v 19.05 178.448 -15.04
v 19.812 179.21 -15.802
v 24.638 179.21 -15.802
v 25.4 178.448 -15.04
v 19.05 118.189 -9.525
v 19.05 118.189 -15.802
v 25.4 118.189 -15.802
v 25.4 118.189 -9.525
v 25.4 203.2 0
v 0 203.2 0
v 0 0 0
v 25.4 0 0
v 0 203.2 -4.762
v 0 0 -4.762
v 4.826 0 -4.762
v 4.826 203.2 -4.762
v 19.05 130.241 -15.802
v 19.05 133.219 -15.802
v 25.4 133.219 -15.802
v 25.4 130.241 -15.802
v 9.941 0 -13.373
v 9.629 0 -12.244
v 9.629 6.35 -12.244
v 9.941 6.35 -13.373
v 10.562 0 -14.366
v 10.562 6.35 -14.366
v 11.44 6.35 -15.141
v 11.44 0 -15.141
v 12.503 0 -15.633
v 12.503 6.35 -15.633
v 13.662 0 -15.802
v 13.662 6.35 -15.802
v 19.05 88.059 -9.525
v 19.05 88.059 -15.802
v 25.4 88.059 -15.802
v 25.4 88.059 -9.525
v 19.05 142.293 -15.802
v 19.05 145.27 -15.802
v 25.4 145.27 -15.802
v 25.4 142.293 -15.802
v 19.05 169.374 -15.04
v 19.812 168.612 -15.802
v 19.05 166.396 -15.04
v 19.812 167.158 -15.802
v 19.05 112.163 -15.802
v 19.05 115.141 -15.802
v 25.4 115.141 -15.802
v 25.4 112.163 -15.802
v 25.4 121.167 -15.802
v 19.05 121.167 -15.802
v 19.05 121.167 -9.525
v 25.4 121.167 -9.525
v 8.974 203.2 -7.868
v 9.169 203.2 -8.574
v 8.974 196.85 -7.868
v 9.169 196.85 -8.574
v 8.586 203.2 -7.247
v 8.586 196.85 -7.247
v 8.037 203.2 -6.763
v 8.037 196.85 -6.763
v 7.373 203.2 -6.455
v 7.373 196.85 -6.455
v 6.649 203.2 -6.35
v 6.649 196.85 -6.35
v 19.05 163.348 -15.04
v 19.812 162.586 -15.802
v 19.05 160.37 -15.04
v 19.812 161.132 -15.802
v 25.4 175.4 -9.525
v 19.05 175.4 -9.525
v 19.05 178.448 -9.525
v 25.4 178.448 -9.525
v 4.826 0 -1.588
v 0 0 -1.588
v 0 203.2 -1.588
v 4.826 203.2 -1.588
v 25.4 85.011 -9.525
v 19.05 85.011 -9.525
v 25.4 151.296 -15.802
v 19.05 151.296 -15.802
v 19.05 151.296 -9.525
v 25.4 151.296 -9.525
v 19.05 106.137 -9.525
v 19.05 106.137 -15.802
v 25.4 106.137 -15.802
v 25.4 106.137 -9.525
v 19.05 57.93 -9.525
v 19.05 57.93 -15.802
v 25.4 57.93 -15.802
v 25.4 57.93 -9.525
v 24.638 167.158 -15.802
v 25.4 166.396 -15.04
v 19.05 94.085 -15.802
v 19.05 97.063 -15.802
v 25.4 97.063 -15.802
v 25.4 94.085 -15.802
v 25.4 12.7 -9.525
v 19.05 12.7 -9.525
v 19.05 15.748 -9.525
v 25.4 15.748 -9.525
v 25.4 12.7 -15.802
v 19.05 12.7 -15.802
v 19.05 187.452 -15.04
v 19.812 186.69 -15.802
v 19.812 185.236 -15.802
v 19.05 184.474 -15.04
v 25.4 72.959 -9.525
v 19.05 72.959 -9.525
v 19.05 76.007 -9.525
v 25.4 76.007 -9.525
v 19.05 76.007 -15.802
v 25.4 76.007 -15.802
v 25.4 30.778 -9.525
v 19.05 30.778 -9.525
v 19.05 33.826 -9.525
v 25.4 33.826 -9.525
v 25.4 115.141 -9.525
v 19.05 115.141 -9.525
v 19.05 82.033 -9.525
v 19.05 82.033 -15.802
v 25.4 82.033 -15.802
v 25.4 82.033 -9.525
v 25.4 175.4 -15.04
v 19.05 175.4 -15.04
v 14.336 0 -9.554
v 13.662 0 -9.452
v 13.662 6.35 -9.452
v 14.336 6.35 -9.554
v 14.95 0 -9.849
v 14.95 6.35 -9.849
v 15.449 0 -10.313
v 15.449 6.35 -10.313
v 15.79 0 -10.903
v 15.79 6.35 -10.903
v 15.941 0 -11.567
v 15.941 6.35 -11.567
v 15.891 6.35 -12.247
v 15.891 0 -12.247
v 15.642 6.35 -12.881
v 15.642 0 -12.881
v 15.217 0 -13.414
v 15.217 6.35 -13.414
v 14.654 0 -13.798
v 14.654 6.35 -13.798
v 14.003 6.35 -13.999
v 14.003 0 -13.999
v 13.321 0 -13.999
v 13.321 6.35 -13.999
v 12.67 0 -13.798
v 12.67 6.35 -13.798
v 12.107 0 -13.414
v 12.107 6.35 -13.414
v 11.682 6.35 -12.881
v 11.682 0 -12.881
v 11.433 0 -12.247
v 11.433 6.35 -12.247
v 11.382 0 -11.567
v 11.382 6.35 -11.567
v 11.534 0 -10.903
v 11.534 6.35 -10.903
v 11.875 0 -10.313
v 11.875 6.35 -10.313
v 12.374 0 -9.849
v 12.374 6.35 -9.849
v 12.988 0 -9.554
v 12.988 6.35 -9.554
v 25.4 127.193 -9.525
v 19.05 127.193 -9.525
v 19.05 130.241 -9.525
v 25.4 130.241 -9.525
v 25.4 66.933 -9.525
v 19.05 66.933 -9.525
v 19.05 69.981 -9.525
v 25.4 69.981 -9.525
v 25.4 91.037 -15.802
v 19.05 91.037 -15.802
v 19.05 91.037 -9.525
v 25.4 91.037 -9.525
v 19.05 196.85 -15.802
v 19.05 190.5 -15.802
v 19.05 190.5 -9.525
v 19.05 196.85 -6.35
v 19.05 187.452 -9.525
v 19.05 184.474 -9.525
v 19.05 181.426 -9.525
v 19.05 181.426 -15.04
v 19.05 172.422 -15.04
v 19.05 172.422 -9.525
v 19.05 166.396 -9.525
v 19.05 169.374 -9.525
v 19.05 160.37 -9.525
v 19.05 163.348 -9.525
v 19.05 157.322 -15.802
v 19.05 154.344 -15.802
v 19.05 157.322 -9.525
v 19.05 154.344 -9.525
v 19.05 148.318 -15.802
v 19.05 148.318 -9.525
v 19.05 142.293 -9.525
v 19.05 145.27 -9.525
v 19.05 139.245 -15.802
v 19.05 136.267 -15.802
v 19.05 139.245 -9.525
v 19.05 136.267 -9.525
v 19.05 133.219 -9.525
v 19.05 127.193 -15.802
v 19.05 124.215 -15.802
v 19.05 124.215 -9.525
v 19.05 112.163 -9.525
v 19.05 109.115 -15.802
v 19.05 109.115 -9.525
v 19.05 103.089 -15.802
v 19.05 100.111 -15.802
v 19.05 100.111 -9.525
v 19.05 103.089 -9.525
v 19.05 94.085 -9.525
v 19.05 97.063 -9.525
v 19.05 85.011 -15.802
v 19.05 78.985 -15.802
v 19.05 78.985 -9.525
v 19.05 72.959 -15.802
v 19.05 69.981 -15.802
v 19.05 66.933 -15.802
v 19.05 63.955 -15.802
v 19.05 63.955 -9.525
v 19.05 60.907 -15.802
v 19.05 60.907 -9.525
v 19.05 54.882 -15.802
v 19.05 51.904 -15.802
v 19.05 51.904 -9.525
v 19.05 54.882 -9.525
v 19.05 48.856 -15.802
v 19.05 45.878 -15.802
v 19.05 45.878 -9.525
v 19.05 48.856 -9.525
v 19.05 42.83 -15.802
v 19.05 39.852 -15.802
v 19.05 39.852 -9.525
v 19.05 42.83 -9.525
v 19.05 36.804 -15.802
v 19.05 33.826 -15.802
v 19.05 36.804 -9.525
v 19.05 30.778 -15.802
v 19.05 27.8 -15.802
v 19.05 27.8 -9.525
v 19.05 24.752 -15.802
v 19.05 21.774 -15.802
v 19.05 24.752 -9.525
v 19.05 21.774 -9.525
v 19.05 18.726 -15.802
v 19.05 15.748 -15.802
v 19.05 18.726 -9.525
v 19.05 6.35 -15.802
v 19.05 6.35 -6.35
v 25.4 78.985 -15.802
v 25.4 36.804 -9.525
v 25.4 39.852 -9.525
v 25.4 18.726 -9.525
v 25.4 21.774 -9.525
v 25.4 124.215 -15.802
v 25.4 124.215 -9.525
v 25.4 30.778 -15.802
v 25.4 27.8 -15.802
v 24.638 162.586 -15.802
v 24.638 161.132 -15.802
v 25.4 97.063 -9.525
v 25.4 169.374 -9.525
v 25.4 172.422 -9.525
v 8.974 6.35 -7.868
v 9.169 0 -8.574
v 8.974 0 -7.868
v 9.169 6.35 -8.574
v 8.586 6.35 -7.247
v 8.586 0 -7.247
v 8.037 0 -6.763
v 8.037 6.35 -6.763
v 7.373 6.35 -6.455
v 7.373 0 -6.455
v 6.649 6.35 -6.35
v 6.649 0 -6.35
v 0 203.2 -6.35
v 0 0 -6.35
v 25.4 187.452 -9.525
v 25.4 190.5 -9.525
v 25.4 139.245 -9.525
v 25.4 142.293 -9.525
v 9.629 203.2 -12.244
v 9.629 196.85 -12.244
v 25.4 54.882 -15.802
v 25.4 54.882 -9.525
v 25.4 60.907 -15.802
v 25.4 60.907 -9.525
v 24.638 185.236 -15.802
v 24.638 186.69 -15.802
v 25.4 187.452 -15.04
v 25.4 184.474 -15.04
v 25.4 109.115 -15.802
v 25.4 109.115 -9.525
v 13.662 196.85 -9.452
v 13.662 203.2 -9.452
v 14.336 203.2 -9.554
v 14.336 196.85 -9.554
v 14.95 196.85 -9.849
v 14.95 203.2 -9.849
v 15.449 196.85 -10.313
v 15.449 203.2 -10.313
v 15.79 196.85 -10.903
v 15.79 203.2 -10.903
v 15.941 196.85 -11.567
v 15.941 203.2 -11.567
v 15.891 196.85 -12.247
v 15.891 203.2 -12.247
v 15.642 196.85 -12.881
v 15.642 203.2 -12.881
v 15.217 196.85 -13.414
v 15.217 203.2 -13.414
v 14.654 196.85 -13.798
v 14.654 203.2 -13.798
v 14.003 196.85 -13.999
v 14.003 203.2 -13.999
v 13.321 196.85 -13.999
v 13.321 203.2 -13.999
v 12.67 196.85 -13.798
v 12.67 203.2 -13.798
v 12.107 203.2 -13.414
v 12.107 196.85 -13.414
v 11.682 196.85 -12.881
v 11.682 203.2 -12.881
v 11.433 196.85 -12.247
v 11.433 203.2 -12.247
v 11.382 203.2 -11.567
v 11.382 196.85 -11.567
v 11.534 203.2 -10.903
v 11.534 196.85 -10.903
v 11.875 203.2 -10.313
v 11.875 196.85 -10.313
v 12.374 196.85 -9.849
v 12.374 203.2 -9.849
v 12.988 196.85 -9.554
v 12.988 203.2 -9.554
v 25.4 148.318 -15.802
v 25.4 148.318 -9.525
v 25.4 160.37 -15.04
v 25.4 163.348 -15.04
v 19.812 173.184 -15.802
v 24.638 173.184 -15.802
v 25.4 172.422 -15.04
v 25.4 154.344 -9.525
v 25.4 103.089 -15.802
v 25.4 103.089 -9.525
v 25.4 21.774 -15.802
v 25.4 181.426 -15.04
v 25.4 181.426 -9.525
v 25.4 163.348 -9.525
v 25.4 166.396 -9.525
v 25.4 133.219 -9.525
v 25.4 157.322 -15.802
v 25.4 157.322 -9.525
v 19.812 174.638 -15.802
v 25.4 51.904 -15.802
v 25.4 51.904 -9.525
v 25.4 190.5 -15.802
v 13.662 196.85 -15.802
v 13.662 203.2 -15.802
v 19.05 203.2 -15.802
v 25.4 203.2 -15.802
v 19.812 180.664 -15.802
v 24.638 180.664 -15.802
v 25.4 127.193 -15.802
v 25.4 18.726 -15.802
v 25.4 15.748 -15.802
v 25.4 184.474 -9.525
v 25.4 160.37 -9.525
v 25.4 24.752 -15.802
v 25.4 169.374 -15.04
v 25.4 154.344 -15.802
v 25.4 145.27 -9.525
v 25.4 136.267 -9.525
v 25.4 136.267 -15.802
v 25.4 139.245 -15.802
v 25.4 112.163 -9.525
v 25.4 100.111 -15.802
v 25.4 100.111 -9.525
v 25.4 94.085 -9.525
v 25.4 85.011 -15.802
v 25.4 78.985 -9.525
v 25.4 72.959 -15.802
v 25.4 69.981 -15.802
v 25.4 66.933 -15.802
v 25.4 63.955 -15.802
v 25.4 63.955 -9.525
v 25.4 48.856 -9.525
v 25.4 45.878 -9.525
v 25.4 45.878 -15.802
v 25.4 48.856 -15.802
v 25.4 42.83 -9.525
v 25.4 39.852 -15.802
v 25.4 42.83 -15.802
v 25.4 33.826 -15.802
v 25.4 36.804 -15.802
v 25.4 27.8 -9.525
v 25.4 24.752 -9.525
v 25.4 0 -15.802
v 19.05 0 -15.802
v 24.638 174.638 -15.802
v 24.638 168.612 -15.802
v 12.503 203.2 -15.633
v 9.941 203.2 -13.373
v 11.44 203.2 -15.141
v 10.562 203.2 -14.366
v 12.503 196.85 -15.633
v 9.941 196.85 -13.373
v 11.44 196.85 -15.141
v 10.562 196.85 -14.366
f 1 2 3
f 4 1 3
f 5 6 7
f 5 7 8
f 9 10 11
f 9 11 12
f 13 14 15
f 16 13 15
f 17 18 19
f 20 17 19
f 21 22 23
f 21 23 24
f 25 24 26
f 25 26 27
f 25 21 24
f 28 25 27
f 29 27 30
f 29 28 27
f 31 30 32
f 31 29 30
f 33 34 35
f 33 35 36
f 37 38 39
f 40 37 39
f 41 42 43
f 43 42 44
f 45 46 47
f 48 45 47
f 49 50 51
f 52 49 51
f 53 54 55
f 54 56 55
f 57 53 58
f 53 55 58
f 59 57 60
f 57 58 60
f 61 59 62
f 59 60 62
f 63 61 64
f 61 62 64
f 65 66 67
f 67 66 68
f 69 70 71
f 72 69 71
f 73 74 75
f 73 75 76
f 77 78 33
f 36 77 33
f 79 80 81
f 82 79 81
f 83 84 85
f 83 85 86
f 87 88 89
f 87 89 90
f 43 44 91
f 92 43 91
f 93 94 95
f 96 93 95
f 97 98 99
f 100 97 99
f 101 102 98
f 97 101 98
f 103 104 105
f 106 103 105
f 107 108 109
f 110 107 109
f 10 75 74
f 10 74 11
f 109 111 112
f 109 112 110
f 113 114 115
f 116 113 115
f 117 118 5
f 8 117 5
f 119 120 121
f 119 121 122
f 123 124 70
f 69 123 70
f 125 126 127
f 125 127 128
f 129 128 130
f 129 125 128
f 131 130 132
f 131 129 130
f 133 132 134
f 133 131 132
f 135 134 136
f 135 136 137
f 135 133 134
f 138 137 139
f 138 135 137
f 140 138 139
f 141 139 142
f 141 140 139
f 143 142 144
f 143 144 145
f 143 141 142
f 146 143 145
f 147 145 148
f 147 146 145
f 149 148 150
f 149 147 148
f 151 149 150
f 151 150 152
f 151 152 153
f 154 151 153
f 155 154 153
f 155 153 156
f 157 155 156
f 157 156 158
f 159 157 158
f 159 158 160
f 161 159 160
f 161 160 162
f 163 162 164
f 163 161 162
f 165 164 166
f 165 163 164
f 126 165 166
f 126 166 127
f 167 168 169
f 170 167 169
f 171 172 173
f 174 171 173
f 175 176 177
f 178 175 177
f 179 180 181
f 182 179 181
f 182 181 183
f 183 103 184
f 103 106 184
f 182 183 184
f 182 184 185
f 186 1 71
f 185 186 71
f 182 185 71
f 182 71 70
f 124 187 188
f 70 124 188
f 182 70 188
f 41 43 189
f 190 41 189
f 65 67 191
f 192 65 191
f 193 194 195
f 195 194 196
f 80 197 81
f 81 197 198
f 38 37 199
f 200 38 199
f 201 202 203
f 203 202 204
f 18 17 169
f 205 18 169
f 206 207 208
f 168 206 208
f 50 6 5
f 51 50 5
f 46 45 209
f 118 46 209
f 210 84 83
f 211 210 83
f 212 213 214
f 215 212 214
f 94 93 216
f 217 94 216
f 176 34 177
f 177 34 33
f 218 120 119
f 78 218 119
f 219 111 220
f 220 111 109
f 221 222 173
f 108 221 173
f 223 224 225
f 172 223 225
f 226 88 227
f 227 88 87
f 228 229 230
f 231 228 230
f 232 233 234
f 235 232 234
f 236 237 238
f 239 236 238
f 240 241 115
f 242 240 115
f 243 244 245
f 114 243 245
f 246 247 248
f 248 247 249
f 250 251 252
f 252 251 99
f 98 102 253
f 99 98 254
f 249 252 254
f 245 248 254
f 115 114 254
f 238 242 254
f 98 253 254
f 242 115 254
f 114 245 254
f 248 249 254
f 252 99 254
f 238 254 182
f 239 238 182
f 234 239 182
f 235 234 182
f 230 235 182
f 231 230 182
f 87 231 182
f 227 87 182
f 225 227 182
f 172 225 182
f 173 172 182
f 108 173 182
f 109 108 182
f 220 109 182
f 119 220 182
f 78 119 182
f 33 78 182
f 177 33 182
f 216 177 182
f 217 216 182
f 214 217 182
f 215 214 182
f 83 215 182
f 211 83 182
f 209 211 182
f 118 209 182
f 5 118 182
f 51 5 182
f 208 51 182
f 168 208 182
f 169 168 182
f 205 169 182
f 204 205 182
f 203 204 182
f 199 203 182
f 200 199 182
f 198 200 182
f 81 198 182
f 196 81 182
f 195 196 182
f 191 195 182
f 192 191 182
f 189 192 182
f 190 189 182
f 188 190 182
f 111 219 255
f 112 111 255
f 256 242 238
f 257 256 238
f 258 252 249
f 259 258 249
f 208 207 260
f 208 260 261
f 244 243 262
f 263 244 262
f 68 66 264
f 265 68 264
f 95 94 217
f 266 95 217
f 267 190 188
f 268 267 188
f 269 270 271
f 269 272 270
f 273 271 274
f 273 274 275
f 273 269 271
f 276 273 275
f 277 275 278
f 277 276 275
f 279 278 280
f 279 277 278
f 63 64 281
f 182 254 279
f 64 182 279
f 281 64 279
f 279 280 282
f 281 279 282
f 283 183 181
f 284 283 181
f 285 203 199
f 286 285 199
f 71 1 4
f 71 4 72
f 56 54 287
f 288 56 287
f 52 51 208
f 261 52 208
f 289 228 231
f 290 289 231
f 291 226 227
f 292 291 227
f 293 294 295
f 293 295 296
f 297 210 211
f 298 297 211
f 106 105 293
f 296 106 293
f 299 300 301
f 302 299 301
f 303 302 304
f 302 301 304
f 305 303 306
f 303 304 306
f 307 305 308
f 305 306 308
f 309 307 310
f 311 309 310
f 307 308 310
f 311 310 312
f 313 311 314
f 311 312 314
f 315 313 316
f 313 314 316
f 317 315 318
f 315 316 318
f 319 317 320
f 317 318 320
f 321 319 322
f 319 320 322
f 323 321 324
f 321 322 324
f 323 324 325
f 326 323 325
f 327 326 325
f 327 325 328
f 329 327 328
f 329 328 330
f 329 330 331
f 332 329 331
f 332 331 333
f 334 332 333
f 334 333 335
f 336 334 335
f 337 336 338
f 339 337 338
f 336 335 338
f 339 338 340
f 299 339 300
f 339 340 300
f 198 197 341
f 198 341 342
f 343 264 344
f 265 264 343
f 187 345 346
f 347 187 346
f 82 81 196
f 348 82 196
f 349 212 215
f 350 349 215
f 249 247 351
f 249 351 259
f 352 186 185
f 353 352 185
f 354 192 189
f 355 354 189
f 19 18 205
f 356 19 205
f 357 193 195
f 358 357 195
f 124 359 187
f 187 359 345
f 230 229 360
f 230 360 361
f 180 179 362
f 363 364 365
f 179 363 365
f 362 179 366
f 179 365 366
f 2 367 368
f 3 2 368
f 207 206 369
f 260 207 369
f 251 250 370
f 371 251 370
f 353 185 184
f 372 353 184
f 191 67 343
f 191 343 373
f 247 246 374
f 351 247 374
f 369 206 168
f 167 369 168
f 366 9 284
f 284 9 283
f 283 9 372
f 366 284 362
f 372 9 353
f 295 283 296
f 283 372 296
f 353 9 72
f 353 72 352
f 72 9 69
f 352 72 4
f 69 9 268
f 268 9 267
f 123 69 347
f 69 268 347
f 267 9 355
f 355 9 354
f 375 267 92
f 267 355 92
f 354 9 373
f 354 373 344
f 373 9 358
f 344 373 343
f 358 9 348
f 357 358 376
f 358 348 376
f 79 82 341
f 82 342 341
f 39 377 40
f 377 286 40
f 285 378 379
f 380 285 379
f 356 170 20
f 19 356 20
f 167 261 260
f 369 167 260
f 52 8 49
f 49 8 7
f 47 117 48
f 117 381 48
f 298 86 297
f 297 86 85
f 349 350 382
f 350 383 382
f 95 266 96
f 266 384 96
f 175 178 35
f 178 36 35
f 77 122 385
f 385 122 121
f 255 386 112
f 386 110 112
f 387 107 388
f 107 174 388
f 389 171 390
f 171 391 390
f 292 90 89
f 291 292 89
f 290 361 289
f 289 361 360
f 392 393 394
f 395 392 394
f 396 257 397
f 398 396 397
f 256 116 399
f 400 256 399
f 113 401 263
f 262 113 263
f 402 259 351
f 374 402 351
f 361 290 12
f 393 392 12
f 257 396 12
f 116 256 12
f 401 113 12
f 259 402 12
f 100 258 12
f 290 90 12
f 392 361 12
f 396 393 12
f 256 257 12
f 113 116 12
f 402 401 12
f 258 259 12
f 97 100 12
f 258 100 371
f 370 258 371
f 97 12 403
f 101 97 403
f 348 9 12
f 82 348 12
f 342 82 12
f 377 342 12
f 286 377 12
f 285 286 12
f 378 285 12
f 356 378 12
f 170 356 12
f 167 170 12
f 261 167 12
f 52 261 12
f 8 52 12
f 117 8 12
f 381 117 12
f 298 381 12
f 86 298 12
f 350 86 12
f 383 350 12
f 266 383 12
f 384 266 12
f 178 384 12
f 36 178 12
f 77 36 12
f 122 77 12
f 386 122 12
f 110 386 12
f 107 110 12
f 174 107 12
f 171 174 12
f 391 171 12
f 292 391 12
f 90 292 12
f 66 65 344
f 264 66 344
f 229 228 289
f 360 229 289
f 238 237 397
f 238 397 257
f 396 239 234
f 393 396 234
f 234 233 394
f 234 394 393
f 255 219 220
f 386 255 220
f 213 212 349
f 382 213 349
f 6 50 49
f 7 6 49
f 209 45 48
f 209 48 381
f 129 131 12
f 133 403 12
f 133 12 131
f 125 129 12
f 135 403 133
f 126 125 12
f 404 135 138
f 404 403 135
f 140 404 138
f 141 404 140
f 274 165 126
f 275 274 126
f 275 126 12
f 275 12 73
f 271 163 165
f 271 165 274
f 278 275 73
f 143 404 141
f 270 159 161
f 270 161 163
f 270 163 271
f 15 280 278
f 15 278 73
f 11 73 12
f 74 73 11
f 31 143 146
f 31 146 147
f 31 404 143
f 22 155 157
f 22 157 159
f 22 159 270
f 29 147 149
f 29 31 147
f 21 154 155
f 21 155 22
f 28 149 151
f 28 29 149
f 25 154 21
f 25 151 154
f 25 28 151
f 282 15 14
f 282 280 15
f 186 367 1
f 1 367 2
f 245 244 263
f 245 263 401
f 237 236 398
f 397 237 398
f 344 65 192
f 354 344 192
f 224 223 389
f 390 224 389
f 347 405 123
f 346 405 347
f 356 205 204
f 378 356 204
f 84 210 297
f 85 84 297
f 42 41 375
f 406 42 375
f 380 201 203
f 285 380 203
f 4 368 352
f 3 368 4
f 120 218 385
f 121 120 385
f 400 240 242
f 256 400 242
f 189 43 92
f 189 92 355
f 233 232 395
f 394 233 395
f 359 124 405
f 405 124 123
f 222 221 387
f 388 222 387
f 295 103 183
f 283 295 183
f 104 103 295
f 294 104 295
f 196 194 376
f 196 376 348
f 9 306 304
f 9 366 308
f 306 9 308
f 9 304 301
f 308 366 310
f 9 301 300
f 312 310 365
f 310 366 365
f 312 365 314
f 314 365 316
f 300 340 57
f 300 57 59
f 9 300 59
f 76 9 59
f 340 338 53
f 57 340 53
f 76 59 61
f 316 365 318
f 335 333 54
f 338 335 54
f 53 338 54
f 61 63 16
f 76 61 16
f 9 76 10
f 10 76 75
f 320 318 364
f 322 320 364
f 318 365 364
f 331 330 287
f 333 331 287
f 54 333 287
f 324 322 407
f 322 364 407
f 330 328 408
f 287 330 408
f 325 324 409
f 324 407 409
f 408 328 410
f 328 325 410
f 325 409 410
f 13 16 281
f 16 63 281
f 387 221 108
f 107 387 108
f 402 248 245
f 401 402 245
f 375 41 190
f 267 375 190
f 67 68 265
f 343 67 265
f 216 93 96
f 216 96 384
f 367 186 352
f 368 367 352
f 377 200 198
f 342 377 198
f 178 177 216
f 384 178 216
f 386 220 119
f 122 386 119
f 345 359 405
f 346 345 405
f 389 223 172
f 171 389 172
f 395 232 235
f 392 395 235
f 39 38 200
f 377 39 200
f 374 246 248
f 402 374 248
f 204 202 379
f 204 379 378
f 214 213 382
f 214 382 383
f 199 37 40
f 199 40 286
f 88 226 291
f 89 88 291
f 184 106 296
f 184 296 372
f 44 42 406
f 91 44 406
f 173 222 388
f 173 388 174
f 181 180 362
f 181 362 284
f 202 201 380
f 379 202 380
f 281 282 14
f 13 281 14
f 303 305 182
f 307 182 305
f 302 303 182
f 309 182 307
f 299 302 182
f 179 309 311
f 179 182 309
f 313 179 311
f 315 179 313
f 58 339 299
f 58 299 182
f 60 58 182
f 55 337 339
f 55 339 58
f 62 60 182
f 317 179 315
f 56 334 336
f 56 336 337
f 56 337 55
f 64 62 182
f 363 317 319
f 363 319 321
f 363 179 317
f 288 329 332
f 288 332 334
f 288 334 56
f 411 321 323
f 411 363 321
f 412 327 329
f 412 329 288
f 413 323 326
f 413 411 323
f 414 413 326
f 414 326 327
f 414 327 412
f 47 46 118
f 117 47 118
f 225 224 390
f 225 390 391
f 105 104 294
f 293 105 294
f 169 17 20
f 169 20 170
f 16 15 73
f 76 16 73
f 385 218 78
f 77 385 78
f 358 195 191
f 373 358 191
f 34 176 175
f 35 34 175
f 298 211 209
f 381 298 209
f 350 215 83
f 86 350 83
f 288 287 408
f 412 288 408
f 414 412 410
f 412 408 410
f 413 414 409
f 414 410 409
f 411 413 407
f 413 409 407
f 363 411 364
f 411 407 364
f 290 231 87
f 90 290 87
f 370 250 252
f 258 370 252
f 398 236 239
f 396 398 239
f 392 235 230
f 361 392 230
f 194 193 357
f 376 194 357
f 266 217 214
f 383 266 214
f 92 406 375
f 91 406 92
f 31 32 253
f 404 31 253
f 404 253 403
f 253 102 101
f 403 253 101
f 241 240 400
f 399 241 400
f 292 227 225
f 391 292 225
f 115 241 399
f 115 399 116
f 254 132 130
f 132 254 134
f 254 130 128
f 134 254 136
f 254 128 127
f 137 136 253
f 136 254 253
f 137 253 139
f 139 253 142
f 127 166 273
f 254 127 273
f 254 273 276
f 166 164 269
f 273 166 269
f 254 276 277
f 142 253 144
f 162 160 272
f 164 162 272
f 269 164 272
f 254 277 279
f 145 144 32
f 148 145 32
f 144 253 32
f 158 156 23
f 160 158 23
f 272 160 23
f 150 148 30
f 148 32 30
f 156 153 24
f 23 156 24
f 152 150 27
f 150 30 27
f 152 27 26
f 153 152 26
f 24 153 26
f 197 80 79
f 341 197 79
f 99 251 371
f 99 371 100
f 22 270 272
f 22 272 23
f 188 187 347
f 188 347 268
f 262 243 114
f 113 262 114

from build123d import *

# Parameters (mm, degrees)
BOSS_EXTRUDE1_DEPTH  = 203.2
SKETCH2_R            = 2.286
BOSS_EXTRUDE2_DEPTH  = 6.35
FILLET1_R            = 2.54
FILLET1_OF_MIRROR1_R = 2.54
SKETCH5_W            = 6.35
SKETCH5_H            = 9.597846327
CUT_EXTRUDE3_DEPTH   = 207.350575478
SKETCH3_W            = 6.277153673
SKETCH3_H            = 3.048
CUT_EXTRUDE1_DEPTH   = 205.701857736
SKETCH4_W            = 4.826
SKETCH4_H            = 3.175
CUT_EXTRUDE2_DEPTH   = 206.39013623
CHAMFER1_SIZE        = 0.762


with BuildPart() as part:
    # Sketch1 → Boss-Extrude1 (new body)
    with BuildSketch(Plane(origin=(0, 0, 0), x_dir=(1, 0, 0), z_dir=(0, 1, 0))):
        Polygon((0, 0), (25.4, 0), (25.4, 25.4), (19.05, 25.4), (19.05, 6.35), (0, 6.35), align=None)
    extrude(amount=BOSS_EXTRUDE1_DEPTH)

    # Sketch2 → Boss-Extrude2 (add)
    with BuildSketch(Plane(origin=(0, 203.2, 0), x_dir=(1, 0, 0), z_dir=(0, 1, 0))):
        with BuildLine():
            Line((19.05, 15.802153673), (19.05, 6.35))
            Line((19.05, 6.35), (8.89, 6.35))
            Line((8.89, 6.35), (9.629456844, 12.244049961))
            ThreePointArc((9.629456844, 12.244049961), (10.972967985, 14.785452355), (13.661846327, 15.802153673))
            Line((13.661846327, 15.802153673), (19.05, 15.802153673))
        make_face()
        with Locations(Location((13.661846327, 11.738153673, 0), (0, 0, 270))):
            Circle(SKETCH2_R, mode=Mode.SUBTRACT)
    boss_extrude2 = extrude(amount=-BOSS_EXTRUDE2_DEPTH)

    # Fillet1
    fillet1_edges = [part.edges().sort_by_distance(p)[0] for p in [
        (8.89, 200.025, -6.35),
    ]]
    fillet(fillet1_edges, radius=FILLET1_R)

    # Mirror1: Boss-Extrude2 across plane
    add(boss_extrude2.mirror(Plane.ZX.offset(101.6)))

    # Fillet1 of Mirror1
    fillet1_of_mirror1_edges = [part.edges().sort_by_distance(p)[0] for p in [
        (8.89, 3.175, -6.35),
    ]]
    fillet(fillet1_of_mirror1_edges, radius=FILLET1_OF_MIRROR1_R)

    # Sketch5 → Cut-Extrude3 (cut, through all)
    with BuildSketch(Plane(origin=(0, 203.2, 0), x_dir=(1, 0, 0), z_dir=(0, 1, 0))):
        with Locations((22.225, 20.601076837)):
            Rectangle(SKETCH5_W, SKETCH5_H)
    extrude(amount=-CUT_EXTRUDE3_DEPTH, mode=Mode.SUBTRACT)

    # Sketch3 → Cut-Extrude1 (cut, through all)
    with BuildSketch(Plane.ZY.offset(-19.05)):
        with Locations((-12.663576837, 188.976)):
            Rectangle(SKETCH3_W, SKETCH3_H)
        with Locations((-12.663576837, 182.950068966)):
            Rectangle(SKETCH3_W, SKETCH3_H)
        with Locations((-12.663576837, 176.924137931)):
            Rectangle(SKETCH3_W, SKETCH3_H)
        with Locations((-12.663576837, 170.898206897)):
            Rectangle(SKETCH3_W, SKETCH3_H)
        with Locations((-12.663576837, 164.872275862)):
            Rectangle(SKETCH3_W, SKETCH3_H)
        with Locations((-12.663576837, 158.846344828)):
            Rectangle(SKETCH3_W, SKETCH3_H)
        with Locations((-12.663576837, 152.820413793)):
            Rectangle(SKETCH3_W, SKETCH3_H)
        with Locations((-12.663576837, 146.794482759)):
            Rectangle(SKETCH3_W, SKETCH3_H)
        with Locations((-12.663576837, 140.768551724)):
            Rectangle(SKETCH3_W, SKETCH3_H)
        with Locations((-12.663576837, 134.74262069)):
            Rectangle(SKETCH3_W, SKETCH3_H)
        with Locations((-12.663576837, 128.716689655)):
            Rectangle(SKETCH3_W, SKETCH3_H)
        with Locations((-12.663576837, 122.690758621)):
            Rectangle(SKETCH3_W, SKETCH3_H)
        with Locations((-12.663576837, 116.664827586)):
            Rectangle(SKETCH3_W, SKETCH3_H)
        with Locations((-12.663576837, 110.638896552)):
            Rectangle(SKETCH3_W, SKETCH3_H)
        with Locations((-12.663576837, 104.612965517)):
            Rectangle(SKETCH3_W, SKETCH3_H)
        with Locations((-12.663576837, 98.587034483)):
            Rectangle(SKETCH3_W, SKETCH3_H)
        with Locations((-12.663576837, 92.561103448)):
            Rectangle(SKETCH3_W, SKETCH3_H)
        with Locations((-12.663576837, 86.535172414)):
            Rectangle(SKETCH3_W, SKETCH3_H)
        with Locations((-12.663576837, 80.509241379)):
            Rectangle(SKETCH3_W, SKETCH3_H)
        with Locations((-12.663576837, 74.483310345)):
            Rectangle(SKETCH3_W, SKETCH3_H)
        with Locations((-12.663576837, 68.45737931)):
            Rectangle(SKETCH3_W, SKETCH3_H)
        with Locations((-12.663576837, 62.431448276)):
            Rectangle(SKETCH3_W, SKETCH3_H)
        with Locations((-12.663576837, 56.405517241)):
            Rectangle(SKETCH3_W, SKETCH3_H)
        with Locations((-12.663576837, 50.379586207)):
            Rectangle(SKETCH3_W, SKETCH3_H)
        with Locations((-12.663576837, 44.353655172)):
            Rectangle(SKETCH3_W, SKETCH3_H)
        with Locations((-12.663576837, 38.327724138)):
            Rectangle(SKETCH3_W, SKETCH3_H)
        with Locations((-12.663576837, 32.301793103)):
            Rectangle(SKETCH3_W, SKETCH3_H)
        with Locations((-12.663576837, 26.275862069)):
            Rectangle(SKETCH3_W, SKETCH3_H)
        with Locations((-12.663576837, 20.249931034)):
            Rectangle(SKETCH3_W, SKETCH3_H)
        with Locations((-12.663576837, 14.224)):
            Rectangle(SKETCH3_W, SKETCH3_H)
    extrude(amount=-CUT_EXTRUDE1_DEPTH, mode=Mode.SUBTRACT)

    # Sketch4 → Cut-Extrude2 (cut, through all)
    with BuildSketch(Plane.XZ):
        with Locations((2.413, -3.175)):
            Rectangle(SKETCH4_W, SKETCH4_H)
    extrude(amount=-CUT_EXTRUDE2_DEPTH, mode=Mode.SUBTRACT)

    # Chamfer1
    chamfer1_edges = [part.edges().sort_by_distance(p)[0] for p in [
        (25.4, 161.859310345, -15.802153673),
        (25.4, 167.885241379, -15.802153673),
        (25.4, 173.911172414, -15.802153673),
        (25.4, 179.937103448, -15.802153673),
        (25.4, 185.963034483, -15.802153673),
        (19.05, 161.859310345, -15.802153673),
        (19.05, 167.885241379, -15.802153673),
        (19.05, 173.911172414, -15.802153673),
        (19.05, 179.937103448, -15.802153673),
        (19.05, 185.963034483, -15.802153673),
        (22.225, 187.452, -15.802153673),
        (22.225, 160.370344828, -15.802153673),
        (22.225, 166.396275862, -15.802153673),
        (22.225, 163.348275862, -15.802153673),
        (22.225, 184.474068966, -15.802153673),
        (22.225, 181.426068966, -15.802153673),
        (22.225, 178.448137931, -15.802153673),
        (22.225, 175.400137931, -15.802153673),
        (22.225, 172.422206897, -15.802153673),
        (22.225, 169.374206897, -15.802153673),
    ]]
    chamfer(chamfer1_edges, length=CHAMFER1_SIZE)


solid = part.part
